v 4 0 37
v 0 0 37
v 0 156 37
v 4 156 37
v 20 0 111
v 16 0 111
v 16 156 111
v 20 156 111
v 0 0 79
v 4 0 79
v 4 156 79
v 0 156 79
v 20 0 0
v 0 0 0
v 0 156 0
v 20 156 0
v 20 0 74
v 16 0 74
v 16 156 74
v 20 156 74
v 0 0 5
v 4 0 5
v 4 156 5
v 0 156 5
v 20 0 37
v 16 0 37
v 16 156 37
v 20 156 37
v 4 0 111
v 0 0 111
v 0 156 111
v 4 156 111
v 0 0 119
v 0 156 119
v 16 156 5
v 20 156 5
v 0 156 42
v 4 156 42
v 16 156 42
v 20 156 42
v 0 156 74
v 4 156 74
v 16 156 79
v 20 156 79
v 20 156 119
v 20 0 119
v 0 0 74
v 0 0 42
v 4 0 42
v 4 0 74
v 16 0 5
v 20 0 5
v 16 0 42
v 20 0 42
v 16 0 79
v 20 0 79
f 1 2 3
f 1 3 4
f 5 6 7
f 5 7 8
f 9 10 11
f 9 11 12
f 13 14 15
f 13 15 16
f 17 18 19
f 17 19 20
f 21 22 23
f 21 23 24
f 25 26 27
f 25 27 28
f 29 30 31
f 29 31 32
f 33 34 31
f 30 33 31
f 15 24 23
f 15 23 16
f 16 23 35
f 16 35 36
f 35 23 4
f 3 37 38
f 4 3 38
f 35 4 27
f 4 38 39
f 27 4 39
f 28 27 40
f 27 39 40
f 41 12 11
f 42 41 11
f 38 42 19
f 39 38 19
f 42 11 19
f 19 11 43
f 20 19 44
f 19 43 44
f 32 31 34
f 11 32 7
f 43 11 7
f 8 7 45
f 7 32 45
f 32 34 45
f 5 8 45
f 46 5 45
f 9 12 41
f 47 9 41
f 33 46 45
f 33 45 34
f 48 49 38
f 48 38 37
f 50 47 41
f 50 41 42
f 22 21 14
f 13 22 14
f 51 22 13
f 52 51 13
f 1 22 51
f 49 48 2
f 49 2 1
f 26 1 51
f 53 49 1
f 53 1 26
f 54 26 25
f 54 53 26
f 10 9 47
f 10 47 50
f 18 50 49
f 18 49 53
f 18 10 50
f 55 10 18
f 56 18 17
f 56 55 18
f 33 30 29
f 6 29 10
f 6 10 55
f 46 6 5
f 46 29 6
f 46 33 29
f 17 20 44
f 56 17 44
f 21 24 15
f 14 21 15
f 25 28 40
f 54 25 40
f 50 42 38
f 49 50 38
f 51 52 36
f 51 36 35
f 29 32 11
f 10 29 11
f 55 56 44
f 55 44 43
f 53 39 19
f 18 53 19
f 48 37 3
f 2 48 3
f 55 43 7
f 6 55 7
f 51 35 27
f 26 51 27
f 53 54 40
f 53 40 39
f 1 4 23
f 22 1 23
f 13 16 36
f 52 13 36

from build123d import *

# Parameters (mm, degrees)
F3_DEPTH = 156


with BuildPart() as f3:
    # F2 (on Front) → F3 (new body)
    with BuildSketch(Plane.XZ):
        Polygon((0, 5), (0, 0), (20, 0), (20, 5), (16, 5), (16, 37), (20, 37), (20, 42), (16, 42), (16, 74), (20, 74), (20, 79), (16, 79), (16, 111), (20, 111), (20, 119), (0, 119), (0, 111), (4, 111), (4, 79), (0, 79), (0, 74), (4, 74), (4, 42), (0, 42), (0, 37), (4, 37), (4, 5), align=None)
    extrude(amount=-F3_DEPTH)


solid = f3.part
